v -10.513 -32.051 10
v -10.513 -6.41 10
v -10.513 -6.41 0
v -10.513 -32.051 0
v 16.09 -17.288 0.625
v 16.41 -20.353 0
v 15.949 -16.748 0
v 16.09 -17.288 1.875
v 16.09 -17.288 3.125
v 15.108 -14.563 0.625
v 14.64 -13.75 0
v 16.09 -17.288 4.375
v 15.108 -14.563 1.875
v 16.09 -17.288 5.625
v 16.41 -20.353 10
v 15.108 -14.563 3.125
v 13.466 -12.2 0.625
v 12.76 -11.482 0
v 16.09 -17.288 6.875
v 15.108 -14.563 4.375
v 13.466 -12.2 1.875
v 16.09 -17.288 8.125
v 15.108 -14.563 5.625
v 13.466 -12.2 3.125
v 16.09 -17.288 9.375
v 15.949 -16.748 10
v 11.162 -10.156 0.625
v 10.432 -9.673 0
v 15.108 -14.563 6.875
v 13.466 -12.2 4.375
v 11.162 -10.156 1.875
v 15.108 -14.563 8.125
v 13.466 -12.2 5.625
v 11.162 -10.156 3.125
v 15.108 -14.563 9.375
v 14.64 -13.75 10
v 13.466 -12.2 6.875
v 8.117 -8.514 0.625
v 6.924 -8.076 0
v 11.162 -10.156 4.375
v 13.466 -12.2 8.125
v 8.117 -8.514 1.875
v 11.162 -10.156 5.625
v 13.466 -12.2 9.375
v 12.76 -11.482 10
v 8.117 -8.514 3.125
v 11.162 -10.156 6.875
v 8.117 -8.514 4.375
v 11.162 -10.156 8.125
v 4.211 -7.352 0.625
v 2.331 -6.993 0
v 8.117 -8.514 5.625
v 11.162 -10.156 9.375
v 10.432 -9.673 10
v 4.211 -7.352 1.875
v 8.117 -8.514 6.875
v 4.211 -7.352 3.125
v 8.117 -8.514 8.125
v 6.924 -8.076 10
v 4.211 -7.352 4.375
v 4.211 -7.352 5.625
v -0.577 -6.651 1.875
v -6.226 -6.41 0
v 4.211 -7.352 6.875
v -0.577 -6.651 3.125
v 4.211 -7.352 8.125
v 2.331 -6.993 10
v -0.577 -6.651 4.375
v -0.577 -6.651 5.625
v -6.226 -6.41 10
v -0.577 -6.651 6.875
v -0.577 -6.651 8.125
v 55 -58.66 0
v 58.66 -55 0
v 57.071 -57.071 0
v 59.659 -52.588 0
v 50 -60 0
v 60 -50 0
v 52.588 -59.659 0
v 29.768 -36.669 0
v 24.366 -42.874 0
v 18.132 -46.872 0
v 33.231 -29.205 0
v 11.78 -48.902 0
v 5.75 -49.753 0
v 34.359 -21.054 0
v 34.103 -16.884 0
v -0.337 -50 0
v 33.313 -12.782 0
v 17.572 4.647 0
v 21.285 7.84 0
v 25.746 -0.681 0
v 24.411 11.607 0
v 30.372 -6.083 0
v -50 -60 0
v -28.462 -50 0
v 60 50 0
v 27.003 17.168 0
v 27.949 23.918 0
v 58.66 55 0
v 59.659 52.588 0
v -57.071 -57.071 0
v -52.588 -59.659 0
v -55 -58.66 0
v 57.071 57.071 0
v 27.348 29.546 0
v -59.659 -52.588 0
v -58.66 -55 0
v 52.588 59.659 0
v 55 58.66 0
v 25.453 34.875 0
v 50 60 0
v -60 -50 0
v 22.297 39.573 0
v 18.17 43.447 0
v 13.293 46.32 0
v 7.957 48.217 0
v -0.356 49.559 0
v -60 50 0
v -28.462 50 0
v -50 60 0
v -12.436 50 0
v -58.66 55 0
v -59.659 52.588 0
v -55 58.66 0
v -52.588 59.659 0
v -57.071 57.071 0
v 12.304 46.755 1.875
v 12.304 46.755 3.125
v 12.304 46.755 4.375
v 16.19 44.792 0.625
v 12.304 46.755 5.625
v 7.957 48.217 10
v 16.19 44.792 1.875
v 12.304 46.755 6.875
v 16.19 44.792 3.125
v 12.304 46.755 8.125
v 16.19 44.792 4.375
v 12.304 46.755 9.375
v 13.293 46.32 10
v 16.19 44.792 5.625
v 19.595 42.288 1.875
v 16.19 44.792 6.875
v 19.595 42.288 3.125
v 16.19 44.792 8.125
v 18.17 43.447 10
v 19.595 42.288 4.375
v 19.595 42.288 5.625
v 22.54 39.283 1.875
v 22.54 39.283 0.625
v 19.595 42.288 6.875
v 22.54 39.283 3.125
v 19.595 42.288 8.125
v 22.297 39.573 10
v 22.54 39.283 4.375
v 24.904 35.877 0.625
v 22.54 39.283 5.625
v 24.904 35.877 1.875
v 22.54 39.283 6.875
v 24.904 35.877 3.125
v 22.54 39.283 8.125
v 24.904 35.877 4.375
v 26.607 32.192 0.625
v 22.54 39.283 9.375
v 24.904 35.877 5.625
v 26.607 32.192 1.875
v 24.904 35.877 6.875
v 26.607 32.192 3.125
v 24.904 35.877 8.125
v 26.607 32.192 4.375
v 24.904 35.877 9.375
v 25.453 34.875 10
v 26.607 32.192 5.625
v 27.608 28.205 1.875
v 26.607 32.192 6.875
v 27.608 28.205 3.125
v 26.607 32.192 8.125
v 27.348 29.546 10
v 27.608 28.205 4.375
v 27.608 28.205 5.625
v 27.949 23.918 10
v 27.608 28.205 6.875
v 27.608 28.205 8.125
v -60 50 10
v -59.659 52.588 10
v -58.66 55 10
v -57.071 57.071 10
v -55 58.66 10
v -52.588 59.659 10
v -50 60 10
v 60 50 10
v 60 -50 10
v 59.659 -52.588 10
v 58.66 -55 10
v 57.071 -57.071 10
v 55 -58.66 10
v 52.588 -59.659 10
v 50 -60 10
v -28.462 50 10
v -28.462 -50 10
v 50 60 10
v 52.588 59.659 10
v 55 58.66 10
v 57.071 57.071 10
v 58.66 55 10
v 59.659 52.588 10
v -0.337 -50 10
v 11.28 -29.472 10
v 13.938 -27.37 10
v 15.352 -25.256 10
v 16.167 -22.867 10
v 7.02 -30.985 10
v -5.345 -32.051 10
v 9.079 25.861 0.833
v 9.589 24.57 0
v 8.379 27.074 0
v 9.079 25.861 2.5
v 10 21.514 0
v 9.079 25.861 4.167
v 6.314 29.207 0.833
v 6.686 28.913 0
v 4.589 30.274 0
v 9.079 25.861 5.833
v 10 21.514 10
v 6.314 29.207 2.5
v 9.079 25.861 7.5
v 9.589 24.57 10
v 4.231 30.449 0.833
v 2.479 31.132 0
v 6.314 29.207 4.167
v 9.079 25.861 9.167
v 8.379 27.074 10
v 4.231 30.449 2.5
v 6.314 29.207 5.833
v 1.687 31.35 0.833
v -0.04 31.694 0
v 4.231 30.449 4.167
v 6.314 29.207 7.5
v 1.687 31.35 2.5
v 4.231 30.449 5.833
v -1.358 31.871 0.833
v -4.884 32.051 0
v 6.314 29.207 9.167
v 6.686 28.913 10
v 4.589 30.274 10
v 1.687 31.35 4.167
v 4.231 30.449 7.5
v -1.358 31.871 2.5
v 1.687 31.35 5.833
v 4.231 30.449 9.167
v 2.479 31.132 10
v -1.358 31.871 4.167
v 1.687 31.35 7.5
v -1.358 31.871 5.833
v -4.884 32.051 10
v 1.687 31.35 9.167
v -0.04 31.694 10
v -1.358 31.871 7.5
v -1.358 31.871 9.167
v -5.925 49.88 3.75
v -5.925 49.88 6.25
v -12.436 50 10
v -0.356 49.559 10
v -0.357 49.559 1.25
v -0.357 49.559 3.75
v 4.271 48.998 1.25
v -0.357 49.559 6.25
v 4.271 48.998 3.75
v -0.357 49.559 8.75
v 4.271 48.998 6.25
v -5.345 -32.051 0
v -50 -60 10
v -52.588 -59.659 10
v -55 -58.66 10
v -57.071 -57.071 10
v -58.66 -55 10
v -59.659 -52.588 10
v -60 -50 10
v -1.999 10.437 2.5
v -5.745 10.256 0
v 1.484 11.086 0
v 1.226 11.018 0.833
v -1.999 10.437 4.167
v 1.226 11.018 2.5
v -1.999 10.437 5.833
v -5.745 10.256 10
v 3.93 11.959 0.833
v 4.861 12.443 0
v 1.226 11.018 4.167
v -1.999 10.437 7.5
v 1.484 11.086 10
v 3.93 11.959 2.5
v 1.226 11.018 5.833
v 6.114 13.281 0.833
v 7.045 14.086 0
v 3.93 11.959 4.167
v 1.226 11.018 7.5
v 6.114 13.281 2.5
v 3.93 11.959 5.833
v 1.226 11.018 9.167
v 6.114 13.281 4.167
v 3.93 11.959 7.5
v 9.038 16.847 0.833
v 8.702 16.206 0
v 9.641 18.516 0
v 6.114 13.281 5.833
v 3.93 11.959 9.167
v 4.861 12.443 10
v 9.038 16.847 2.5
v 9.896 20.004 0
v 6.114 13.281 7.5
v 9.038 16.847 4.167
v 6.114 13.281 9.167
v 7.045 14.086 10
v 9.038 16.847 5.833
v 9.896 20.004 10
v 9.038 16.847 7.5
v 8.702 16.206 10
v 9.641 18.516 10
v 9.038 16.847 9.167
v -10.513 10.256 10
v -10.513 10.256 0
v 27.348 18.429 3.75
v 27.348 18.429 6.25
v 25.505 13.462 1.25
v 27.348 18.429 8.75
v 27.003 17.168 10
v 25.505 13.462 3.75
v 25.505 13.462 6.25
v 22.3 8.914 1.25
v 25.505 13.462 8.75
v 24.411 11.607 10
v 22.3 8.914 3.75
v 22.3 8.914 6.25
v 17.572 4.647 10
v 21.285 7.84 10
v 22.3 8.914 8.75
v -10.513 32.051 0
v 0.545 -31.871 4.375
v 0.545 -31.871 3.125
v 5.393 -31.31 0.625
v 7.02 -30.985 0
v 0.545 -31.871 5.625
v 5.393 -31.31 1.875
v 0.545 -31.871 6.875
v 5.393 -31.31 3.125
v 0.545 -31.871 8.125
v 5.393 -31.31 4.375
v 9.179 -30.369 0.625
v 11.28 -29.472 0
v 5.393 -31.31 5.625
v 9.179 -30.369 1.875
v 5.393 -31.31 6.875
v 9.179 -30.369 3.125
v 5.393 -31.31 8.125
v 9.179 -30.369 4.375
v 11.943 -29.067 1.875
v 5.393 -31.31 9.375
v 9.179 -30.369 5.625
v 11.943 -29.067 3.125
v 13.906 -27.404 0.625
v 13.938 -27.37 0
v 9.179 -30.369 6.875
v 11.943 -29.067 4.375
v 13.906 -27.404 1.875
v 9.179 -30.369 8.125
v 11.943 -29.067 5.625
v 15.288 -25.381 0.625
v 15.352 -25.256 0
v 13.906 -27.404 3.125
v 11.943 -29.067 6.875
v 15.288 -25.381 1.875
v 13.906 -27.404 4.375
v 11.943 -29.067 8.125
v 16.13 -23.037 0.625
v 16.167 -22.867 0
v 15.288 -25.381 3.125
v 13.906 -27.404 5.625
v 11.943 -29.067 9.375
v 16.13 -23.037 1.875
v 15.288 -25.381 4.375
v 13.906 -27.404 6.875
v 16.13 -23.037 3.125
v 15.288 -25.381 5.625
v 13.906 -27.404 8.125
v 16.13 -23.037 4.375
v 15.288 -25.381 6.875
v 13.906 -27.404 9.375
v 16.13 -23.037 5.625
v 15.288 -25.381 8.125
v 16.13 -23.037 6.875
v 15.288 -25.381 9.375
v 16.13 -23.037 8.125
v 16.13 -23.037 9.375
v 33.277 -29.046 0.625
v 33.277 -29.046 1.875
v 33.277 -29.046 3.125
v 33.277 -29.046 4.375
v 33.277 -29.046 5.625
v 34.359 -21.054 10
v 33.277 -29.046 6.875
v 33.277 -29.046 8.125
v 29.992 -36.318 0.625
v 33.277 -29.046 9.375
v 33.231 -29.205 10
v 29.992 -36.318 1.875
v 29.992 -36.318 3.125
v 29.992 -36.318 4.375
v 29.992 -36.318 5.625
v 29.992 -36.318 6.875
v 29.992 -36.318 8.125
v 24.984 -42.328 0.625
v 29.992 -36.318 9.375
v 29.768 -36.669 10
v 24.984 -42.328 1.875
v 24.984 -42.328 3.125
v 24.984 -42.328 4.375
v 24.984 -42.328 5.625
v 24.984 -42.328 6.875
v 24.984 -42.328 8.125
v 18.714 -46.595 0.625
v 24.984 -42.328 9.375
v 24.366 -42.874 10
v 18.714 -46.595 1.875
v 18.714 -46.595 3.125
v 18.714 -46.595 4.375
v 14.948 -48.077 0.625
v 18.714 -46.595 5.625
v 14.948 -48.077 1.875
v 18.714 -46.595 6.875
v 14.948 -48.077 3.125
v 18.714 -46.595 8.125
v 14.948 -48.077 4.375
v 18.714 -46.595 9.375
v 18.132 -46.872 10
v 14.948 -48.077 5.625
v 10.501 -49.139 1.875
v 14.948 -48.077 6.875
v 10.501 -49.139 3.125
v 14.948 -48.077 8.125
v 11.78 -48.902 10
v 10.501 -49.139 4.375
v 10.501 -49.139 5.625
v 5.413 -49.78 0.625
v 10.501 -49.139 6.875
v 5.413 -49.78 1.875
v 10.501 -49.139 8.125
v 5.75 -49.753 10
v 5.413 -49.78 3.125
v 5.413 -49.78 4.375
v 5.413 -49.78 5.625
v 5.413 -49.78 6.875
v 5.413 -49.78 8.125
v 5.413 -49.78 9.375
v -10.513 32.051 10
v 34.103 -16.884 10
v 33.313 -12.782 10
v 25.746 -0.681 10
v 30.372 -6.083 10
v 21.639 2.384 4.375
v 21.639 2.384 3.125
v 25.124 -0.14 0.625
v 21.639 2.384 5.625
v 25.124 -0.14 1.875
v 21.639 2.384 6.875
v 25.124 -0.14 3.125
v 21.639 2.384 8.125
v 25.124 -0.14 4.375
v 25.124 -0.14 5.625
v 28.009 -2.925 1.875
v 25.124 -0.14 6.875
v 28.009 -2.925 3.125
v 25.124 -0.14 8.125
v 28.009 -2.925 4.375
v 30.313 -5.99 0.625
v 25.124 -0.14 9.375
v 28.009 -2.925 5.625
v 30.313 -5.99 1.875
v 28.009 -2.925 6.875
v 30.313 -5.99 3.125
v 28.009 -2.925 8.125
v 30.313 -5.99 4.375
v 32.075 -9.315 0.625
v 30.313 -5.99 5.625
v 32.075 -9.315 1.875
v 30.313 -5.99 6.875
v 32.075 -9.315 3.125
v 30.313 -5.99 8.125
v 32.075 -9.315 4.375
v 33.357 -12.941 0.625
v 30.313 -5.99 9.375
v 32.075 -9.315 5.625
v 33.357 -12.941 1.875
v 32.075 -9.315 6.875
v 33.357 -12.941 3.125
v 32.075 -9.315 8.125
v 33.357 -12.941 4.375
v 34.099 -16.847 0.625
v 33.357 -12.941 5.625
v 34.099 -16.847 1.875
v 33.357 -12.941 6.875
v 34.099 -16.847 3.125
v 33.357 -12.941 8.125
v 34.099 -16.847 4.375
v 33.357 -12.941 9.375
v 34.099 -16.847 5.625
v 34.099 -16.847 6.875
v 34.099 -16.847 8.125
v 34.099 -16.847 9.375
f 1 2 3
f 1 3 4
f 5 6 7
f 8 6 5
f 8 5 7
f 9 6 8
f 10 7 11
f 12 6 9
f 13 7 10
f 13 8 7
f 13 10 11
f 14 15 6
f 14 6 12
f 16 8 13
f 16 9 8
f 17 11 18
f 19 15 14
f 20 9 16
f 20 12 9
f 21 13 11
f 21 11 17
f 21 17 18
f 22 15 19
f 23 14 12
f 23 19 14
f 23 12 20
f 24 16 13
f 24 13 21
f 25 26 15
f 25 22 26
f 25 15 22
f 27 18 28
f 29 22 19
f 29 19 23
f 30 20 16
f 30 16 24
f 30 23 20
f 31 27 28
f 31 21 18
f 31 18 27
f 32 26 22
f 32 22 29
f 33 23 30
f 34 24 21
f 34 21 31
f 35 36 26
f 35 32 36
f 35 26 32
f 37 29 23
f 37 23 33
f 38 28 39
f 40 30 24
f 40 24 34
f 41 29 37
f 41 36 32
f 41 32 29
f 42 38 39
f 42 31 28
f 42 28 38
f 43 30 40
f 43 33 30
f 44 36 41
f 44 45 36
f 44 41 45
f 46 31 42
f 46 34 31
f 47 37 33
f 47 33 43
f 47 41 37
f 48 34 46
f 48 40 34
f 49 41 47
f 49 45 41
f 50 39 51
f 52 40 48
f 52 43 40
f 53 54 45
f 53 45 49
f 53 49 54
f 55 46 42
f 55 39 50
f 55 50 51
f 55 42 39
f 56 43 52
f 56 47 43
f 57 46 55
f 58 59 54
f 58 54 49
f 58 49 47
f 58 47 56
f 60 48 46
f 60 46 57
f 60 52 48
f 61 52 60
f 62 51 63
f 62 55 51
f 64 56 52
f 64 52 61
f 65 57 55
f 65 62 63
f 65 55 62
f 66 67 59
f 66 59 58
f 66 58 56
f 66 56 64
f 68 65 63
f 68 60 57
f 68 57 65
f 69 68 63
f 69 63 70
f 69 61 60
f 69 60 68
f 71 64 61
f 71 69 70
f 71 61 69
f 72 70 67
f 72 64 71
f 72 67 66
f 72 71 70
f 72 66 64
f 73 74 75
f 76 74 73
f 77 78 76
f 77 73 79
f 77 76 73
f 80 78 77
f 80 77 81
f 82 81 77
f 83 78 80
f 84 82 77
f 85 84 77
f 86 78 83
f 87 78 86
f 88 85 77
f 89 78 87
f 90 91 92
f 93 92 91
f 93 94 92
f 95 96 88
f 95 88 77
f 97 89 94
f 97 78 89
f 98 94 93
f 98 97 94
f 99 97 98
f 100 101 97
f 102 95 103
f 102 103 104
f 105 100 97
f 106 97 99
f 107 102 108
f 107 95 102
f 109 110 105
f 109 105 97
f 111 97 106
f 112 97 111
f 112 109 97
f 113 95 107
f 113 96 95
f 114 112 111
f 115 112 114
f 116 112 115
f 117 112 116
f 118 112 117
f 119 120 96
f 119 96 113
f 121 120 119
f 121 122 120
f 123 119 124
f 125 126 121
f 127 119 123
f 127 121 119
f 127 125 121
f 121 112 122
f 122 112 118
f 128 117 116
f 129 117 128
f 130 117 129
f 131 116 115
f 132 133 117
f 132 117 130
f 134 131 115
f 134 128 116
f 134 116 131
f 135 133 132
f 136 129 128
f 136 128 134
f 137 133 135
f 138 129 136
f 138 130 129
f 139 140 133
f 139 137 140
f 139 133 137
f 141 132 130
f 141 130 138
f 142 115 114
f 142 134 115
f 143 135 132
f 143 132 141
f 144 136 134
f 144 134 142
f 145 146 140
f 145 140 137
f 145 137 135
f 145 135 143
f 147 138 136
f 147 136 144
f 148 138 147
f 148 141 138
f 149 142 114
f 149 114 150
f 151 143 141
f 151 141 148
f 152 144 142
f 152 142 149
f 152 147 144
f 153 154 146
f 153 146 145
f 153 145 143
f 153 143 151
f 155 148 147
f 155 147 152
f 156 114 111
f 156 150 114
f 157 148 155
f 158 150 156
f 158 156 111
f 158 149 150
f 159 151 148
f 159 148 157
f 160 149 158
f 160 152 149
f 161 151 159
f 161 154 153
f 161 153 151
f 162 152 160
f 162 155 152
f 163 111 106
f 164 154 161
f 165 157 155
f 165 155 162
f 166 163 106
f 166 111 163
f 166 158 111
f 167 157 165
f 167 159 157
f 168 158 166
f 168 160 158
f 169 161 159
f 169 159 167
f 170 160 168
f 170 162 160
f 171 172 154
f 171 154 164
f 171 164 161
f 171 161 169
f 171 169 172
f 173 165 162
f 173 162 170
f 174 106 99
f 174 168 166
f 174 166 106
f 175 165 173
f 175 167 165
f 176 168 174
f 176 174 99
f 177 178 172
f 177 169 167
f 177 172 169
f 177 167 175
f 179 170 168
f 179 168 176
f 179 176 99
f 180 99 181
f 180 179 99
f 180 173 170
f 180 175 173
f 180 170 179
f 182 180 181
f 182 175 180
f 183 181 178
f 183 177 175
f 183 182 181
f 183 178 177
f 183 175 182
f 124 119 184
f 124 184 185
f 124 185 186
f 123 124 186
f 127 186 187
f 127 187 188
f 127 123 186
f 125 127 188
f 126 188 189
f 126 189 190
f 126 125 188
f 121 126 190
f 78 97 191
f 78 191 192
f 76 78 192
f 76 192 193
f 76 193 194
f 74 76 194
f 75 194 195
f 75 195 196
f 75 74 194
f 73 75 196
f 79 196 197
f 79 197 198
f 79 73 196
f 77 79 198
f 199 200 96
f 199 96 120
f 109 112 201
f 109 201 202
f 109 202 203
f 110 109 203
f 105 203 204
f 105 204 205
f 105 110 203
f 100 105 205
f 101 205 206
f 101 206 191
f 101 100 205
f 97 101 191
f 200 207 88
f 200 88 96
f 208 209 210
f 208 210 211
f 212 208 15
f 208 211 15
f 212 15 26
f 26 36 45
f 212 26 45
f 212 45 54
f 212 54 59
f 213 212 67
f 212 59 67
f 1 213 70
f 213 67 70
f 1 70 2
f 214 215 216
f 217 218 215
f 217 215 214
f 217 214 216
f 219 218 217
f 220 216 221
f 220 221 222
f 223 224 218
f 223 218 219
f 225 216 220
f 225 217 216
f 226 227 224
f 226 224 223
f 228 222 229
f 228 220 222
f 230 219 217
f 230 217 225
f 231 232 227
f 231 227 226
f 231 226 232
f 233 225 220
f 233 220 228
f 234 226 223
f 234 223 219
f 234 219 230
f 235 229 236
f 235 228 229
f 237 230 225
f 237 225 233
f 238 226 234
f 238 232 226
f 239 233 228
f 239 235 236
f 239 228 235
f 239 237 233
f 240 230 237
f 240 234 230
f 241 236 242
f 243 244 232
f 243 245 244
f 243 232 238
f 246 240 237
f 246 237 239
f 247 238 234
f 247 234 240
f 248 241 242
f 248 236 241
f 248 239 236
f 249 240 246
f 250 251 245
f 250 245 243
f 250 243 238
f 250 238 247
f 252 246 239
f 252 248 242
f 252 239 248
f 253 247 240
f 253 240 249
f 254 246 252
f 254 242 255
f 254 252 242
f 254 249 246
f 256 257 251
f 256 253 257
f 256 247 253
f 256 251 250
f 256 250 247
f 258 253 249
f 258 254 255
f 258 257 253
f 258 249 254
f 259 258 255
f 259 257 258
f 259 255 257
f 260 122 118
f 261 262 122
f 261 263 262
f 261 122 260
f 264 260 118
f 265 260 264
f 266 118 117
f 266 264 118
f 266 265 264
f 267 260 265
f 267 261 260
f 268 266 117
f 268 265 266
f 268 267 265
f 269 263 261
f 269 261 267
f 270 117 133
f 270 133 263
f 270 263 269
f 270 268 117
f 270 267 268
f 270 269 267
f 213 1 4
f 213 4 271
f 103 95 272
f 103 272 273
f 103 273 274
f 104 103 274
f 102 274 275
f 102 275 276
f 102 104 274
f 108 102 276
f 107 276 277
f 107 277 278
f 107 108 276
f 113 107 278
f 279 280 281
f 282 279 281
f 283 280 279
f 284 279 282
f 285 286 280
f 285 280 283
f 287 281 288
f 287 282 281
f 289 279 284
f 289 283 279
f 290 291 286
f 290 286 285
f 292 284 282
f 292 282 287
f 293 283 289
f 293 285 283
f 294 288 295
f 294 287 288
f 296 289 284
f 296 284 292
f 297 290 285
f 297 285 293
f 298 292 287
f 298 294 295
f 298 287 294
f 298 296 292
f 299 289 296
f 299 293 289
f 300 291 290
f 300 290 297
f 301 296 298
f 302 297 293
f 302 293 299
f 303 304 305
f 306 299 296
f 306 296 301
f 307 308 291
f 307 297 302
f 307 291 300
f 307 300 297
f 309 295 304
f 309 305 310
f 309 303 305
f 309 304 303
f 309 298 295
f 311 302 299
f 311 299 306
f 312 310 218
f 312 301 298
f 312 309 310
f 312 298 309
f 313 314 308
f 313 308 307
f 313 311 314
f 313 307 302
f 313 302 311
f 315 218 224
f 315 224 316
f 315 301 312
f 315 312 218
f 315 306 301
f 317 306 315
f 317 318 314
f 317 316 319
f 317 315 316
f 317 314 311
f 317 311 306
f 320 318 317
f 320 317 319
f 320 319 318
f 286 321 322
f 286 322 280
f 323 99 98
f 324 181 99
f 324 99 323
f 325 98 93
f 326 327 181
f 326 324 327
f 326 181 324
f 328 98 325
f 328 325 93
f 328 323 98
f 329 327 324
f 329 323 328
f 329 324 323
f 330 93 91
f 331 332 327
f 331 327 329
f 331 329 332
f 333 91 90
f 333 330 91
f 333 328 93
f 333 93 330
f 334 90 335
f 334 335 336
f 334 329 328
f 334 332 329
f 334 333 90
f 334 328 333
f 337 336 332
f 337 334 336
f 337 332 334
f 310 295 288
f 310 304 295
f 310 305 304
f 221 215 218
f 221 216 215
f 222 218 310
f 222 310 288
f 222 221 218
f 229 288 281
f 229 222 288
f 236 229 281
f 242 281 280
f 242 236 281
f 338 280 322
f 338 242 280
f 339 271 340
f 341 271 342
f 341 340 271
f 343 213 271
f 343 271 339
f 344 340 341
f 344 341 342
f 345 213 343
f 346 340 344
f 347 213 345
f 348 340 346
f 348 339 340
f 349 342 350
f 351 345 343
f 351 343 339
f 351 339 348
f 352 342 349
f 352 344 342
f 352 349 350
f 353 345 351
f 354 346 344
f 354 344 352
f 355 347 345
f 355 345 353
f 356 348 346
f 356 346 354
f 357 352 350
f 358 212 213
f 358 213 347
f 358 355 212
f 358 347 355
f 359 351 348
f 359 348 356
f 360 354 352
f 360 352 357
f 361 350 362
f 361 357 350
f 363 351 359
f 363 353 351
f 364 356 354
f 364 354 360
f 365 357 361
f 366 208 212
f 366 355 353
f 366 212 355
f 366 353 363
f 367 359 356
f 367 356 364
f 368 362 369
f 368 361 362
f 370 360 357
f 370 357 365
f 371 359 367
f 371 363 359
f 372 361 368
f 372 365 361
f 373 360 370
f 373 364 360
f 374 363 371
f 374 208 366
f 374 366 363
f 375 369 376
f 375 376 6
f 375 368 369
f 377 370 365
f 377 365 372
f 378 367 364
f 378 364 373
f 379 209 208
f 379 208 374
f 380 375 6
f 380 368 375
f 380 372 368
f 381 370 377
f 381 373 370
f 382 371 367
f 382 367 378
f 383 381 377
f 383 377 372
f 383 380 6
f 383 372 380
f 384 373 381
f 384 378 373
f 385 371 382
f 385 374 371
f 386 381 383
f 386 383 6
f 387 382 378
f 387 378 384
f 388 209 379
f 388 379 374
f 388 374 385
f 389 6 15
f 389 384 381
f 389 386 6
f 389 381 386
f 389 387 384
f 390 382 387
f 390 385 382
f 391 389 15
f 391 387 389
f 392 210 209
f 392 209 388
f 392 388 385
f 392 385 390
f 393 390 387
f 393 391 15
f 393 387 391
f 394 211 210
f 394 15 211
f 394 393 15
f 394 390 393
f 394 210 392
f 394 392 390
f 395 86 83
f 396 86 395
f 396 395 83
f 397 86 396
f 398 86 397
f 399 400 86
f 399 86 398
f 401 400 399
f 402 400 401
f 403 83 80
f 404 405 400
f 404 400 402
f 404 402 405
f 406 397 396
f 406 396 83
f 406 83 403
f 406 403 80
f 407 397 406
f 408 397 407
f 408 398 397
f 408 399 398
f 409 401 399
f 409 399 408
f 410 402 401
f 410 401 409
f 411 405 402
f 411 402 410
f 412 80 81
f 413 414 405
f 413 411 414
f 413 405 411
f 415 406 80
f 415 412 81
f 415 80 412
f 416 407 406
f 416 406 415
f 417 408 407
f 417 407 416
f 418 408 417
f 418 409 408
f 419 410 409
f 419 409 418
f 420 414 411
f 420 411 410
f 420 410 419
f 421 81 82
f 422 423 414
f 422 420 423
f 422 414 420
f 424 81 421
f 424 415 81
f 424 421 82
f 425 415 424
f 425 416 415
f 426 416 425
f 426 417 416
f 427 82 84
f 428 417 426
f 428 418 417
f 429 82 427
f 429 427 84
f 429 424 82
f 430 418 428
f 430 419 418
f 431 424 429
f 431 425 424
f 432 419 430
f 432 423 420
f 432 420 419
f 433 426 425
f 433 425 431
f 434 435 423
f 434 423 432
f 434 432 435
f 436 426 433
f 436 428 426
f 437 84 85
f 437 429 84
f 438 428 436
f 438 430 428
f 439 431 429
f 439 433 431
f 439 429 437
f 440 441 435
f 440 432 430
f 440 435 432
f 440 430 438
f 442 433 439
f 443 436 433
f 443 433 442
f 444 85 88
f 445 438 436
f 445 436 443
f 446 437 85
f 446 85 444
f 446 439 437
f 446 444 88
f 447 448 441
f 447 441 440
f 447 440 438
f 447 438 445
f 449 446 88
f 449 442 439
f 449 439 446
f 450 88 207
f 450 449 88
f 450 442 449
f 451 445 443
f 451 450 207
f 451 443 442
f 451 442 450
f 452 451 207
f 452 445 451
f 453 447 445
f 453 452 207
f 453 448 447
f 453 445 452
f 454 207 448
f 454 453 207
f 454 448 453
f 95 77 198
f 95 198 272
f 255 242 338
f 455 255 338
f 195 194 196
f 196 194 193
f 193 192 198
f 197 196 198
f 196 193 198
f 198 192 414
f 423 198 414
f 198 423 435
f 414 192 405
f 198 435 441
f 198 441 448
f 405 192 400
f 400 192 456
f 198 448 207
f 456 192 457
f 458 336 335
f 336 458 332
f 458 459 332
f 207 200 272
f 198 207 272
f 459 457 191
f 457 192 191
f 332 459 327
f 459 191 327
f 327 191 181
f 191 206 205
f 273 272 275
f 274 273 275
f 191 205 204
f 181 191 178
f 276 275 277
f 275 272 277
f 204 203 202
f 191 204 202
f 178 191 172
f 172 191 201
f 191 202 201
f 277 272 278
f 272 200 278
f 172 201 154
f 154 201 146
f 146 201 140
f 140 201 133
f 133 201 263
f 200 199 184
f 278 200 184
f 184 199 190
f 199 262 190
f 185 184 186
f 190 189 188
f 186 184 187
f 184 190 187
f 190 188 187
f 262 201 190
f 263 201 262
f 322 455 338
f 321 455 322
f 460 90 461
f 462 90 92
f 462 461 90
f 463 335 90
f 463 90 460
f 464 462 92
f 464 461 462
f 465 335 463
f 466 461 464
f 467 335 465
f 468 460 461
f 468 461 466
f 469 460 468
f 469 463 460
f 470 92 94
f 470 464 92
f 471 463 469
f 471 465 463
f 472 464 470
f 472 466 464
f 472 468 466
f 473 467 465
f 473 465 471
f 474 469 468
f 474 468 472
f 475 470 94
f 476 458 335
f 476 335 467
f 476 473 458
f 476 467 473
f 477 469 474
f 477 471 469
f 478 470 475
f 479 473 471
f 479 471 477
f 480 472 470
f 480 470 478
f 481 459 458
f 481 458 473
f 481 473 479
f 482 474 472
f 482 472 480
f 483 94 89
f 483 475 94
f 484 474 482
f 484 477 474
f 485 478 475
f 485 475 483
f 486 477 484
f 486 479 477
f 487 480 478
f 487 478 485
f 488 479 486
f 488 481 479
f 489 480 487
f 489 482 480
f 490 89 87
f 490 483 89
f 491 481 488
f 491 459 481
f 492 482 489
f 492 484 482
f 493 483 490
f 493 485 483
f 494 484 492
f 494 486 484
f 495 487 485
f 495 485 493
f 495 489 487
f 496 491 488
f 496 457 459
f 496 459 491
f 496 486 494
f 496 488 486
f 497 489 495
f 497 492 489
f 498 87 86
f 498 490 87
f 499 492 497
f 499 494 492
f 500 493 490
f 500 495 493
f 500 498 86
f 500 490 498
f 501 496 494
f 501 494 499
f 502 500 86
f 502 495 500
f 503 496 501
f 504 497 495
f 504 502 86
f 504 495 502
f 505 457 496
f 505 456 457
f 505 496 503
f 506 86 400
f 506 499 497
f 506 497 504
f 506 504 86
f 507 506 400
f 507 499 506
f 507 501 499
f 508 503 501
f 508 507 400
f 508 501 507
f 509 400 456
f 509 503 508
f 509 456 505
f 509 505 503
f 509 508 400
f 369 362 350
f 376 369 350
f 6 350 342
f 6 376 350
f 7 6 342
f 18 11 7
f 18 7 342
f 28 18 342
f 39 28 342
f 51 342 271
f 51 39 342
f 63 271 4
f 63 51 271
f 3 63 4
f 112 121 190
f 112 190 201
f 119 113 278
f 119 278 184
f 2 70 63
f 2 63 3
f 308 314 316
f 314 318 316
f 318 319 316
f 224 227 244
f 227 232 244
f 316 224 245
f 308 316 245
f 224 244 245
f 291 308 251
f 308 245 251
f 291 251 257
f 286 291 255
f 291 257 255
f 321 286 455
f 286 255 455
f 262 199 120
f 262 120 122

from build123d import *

# Parameters (mm, degrees)
BOSS_EXTRUDE1_DEPTH = 10
CUT_EXTRUDE15_DEPTH = 10


with BuildPart() as part:
    # Sketch1 → Boss-Extrude1 (new body)
    with BuildSketch(Plane.XY):
        with BuildLine():
            Line((-50, 60), (50, 60))
            ThreePointArc((50, 60), (57.071067812, 57.071067812), (60, 50))
            Line((60, 50), (60, -50))
            ThreePointArc((60, -50), (57.071067812, -57.071067812), (50, -60))
            Line((50, -60), (-50, -60))
            ThreePointArc((-50, -60), (-57.071067812, -57.071067812), (-60, -50))
            Line((-60, -50), (-60, 50))
            ThreePointArc((-60, 50), (-57.071067812, 57.071067812), (-50, 60))
        make_face()
    extrude(amount=BOSS_EXTRUDE1_DEPTH)

    # Sketch2 → Cut-Extrude15 (cut)
    with BuildSketch(Plane.XY.offset(10)):
        with BuildLine():
            Line((-28.461538462, -50), (-28.461538462, 50))
            Line((-28.461538462, 50), (-12.435897436, 50))
            add(Edge.make_bspline(
                [(-12.435897436, 50), (-11.31400236, 50.000128036), (-9.143156658, 50.000375783), (-6.011192849, 49.890391497), (-3.106560919, 49.748114501), (-0.438504531, 49.588939628), (1.99751753, 49.31464952), (4.197800896, 49.025577707), (6.166741746, 48.676974917), (7.384030882, 48.364267414), (7.956730769, 48.217147436)],
                knots=[0, 0, 0, 0, 1.311965854, 2.538629056, 3.664479157, 4.713267157, 5.663616078, 6.530575999, 7.308677837, 8, 8, 8, 8], degree=3))
            add(Edge.make_bspline(
                [(7.956730769, 48.217147436), (8.708743867, 48.009632086), (10.184434982, 47.602420351), (12.298095584, 46.780038653), (14.303197505, 45.865903091), (16.197292569, 44.823045384), (17.968750279, 43.638875319), (19.610838491, 42.303994965), (21.158972986, 40.871986363), (22.558183042, 39.302939838), (23.822838395, 37.644951536), (24.921597155, 35.898455894), (25.87627769, 34.09015797), (26.640272179, 32.197301538), (27.215927674, 30.228603714), (27.636959701, 28.192471141), (27.909845467, 26.082460996), (27.935629593, 24.646952129), (27.948717949, 23.918269231)],
                knots=[0, 0, 0, 0, 1.099996261, 2.158545794, 3.195537121, 4.207578794, 5.205712374, 6.197378256, 7.190519799, 8.17788031, 9.159561366, 10.129234751, 11.085776129, 12.040971148, 13.00380137, 13.975669004, 14.972423361, 16, 16, 16, 16], degree=3))
            add(Edge.make_bspline(
                [(27.948717949, 23.918269231), (27.914495785, 22.982102975), (27.847133662, 21.139374723), (27.416819828, 18.432740311), (26.609914344, 15.874581757), (25.554098144, 13.417753165), (24.118518204, 11.071418524), (22.295609324, 8.836693451), (20.114896658, 6.644767409), (18.442169661, 5.3308556), (17.572115385, 4.647435897)],
                knots=[0, 0, 0, 0, 0.986156485, 1.941127874, 2.875419072, 3.804401753, 4.751181392, 5.761612777, 6.835722519, 8, 8, 8, 8], degree=3))
            add(Edge.make_bspline(
                [(17.572115385, 4.647435897), (18.27716563, 4.287513861), (19.659574098, 3.581806327), (21.622187994, 2.421833806), (23.439354226, 1.188055915), (25.119220416, -0.09470324), (26.626549448, -1.480821676), (28.023581469, -2.890429347), (29.24139417, -4.40429091), (30.330398991, -5.968449455), (31.276944281, -7.605554181), (32.101280853, -9.312840386), (32.797568386, -11.096140531), (33.387202678, -12.946379062), (33.826952089, -14.869919934), (34.113678057, -16.867451086), (34.33321338, -18.932159921), (34.350291165, -20.338588018), (34.358974359, -21.053685897)],
                knots=[0, 0, 0, 0, 1.164658916, 2.283573913, 3.35186032, 4.395461096, 5.390182219, 6.362969632, 7.312859996, 8.245001507, 9.165155236, 10.092416118, 11.032087915, 11.979892451, 12.947605196, 13.931445124, 14.948243989, 16, 16, 16, 16], degree=3))
            add(Edge.make_bspline(
                [(34.358974359, -21.053685897), (34.302626235, -22.419481961), (34.191423437, -25.114875014), (33.378362843, -29.072331055), (31.968774121, -32.824358323), (30.075987135, -36.356044655), (27.74370939, -39.56515353), (25.062258807, -42.376305044), (22.058631442, -44.755882393), (19.287422161, -46.361912502), (16.890544368, -47.439708888), (14.905255274, -48.106070581), (12.773096869, -48.723387047), (10.455013131, -49.156879415), (7.993027757, -49.553659299), (5.363136234, -49.798639418), (2.570253782, -49.964656408), (0.651981386, -49.987980619), (-0.336538462, -50)],
                knots=[0, 0, 0, 0, 1.284142165, 2.534249414, 3.780121997, 5.041676246, 6.291546858, 7.49970053, 8.684500223, 9.883330709, 10.50184324, 11.153274765, 11.851151195, 12.587658647, 13.369265475, 14.195992086, 15.070362669, 16, 16, 16, 16], degree=3))
            Line((-0.336538462, -50), (-28.461538462, -50))
        make_face()
        with BuildLine():
            Line((-10.512820513, 32.051282051), (-10.512820513, 10.256410256))
            Line((-10.512820513, 10.256410256), (-5.745192308, 10.256410256))
            add(Edge.make_bspline(
                [(-5.745192308, 10.256410256), (-5.0972288, 10.262060743), (-3.846374462, 10.272968667), (-2.039648051, 10.413458929), (-0.359684264, 10.653144043), (1.187145157, 10.987565071), (2.615249492, 11.412231018), (3.915505598, 11.923195608), (5.082196484, 12.546627947), (6.437621453, 13.475257927), (7.87040339, 14.841778518), (9.131665215, 16.816000643), (9.874540008, 19.086348576), (9.957276223, 20.687573733), (10, 21.514423077)],
                knots=[0, 0, 0, 0, 1.065314748, 2.056525647, 2.977365736, 3.853934255, 4.656397591, 5.425096493, 6.14721249, 6.826394842, 8.123232004, 9.372140726, 10.643011755, 12, 12, 12, 12], degree=3))
            add(Edge.make_bspline(
                [(10, 21.514423077), (9.965813157, 22.288904867), (9.899714271, 23.786334284), (9.151734868, 25.888858547), (7.989974981, 27.75212535), (6.618354145, 29.027379101), (5.326706599, 29.898339815), (4.220718708, 30.471830356), (3.006813948, 30.985213227), (1.661492425, 31.377758282), (0.19243666, 31.67231027), (-1.39321732, 31.88862343), (-3.098205318, 32.035855369), (-4.275844156, 32.046029524), (-4.883814103, 32.051282051)],
                knots=[0, 0, 0, 0, 1.347982417, 2.606269829, 3.849316587, 5.153353503, 5.842674298, 6.568177932, 7.326619318, 8.142485038, 9.012069166, 9.942760135, 10.937925643, 12, 12, 12, 12], degree=3))
            Line((-4.883814103, 32.051282051), (-10.512820513, 32.051282051))
        make_face(mode=Mode.SUBTRACT)
        with BuildLine():
            Line((-10.512820513, -6.41025641), (-10.512820513, -32.051282051))
            Line((-10.512820513, -32.051282051), (-5.344551282, -32.051282051))
            add(Edge.make_bspline(
                [(-5.344551282, -32.051282051), (-4.322777875, -32.045444698), (-2.358290998, -32.034221657), (0.455832973, -31.898620639), (3.014575193, -31.654223695), (5.311155962, -31.349113799), (7.349092928, -30.935737612), (9.121497375, -30.410182767), (10.652675534, -29.831980898), (11.933446385, -29.117832939), (12.979762798, -28.286741812), (13.923953659, -27.437346715), (14.693788053, -26.457489223), (15.302895391, -25.389231902), (15.830076717, -24.259111036), (16.148035265, -23.02299581), (16.390117744, -21.717521716), (16.403440191, -20.814553517), (16.41025641, -20.352564103)],
                knots=[0, 0, 0, 0, 1.753078804, 3.370512758, 4.83203934, 6.162291463, 7.344201807, 8.395507345, 9.331626367, 10.147333109, 10.898971645, 11.62040215, 12.321813352, 13.025280112, 13.727906689, 14.453419512, 15.208716525, 16, 16, 16, 16], degree=3))
            add(Edge.make_bspline(
                [(16.41025641, -20.352564103), (16.39522469, -19.824271941), (16.365946943, -18.795300927), (16.126835227, -17.291349977), (15.692291132, -15.887311977), (15.144961643, -14.547283783), (14.383323578, -13.319243071), (13.478142767, -12.160692009), (12.384453267, -11.110862712), (11.154535621, -10.10625758), (9.719958456, -9.22667136), (8.080048709, -8.463474513), (6.225897499, -7.826080612), (4.151761396, -7.318587171), (1.866733252, -6.887884501), (-0.645865129, -6.630707462), (-3.365107955, -6.439433595), (-5.250675184, -6.420203131), (-6.225961538, -6.41025641)],
                knots=[0, 0, 0, 0, 0.845221588, 1.646264278, 2.427170338, 3.19324141, 3.95557735, 4.731569926, 5.540061037, 6.376114724, 7.268642756, 8.224665384, 9.265483498, 10.400594375, 11.639216012, 12.983232105, 14.439614077, 16, 16, 16, 16], degree=3))
            Line((-6.225961538, -6.41025641), (-10.512820513, -6.41025641))
        make_face(mode=Mode.SUBTRACT)
    extrude(amount=-CUT_EXTRUDE15_DEPTH, mode=Mode.SUBTRACT)


with BuildPart() as cut_extrude15_piece_1:
    # of the separate pieces the step leaves, piece 1, a body of its own (cut_extrude15_pieces)
    add(part.part.solids().sort_by_distance((-50, 60, 0))[0])


with BuildPart() as cut_extrude15_piece_2:
    # of the separate pieces the step leaves, piece 2, a body of its own (cut_extrude15_pieces)
    add(part.part.solids().sort_by_distance((-10.512820513, -6.41025641, 0))[0])


with BuildPart() as cut_extrude15_piece_3:
    # of the separate pieces the step leaves, piece 3, a body of its own (cut_extrude15_pieces)
    add(part.part.solids().sort_by_distance((-10.512820513, 32.051282051, 0))[0])


solid = Compound([cut_extrude15_piece_1.part, cut_extrude15_piece_2.part, cut_extrude15_piece_3.part])
